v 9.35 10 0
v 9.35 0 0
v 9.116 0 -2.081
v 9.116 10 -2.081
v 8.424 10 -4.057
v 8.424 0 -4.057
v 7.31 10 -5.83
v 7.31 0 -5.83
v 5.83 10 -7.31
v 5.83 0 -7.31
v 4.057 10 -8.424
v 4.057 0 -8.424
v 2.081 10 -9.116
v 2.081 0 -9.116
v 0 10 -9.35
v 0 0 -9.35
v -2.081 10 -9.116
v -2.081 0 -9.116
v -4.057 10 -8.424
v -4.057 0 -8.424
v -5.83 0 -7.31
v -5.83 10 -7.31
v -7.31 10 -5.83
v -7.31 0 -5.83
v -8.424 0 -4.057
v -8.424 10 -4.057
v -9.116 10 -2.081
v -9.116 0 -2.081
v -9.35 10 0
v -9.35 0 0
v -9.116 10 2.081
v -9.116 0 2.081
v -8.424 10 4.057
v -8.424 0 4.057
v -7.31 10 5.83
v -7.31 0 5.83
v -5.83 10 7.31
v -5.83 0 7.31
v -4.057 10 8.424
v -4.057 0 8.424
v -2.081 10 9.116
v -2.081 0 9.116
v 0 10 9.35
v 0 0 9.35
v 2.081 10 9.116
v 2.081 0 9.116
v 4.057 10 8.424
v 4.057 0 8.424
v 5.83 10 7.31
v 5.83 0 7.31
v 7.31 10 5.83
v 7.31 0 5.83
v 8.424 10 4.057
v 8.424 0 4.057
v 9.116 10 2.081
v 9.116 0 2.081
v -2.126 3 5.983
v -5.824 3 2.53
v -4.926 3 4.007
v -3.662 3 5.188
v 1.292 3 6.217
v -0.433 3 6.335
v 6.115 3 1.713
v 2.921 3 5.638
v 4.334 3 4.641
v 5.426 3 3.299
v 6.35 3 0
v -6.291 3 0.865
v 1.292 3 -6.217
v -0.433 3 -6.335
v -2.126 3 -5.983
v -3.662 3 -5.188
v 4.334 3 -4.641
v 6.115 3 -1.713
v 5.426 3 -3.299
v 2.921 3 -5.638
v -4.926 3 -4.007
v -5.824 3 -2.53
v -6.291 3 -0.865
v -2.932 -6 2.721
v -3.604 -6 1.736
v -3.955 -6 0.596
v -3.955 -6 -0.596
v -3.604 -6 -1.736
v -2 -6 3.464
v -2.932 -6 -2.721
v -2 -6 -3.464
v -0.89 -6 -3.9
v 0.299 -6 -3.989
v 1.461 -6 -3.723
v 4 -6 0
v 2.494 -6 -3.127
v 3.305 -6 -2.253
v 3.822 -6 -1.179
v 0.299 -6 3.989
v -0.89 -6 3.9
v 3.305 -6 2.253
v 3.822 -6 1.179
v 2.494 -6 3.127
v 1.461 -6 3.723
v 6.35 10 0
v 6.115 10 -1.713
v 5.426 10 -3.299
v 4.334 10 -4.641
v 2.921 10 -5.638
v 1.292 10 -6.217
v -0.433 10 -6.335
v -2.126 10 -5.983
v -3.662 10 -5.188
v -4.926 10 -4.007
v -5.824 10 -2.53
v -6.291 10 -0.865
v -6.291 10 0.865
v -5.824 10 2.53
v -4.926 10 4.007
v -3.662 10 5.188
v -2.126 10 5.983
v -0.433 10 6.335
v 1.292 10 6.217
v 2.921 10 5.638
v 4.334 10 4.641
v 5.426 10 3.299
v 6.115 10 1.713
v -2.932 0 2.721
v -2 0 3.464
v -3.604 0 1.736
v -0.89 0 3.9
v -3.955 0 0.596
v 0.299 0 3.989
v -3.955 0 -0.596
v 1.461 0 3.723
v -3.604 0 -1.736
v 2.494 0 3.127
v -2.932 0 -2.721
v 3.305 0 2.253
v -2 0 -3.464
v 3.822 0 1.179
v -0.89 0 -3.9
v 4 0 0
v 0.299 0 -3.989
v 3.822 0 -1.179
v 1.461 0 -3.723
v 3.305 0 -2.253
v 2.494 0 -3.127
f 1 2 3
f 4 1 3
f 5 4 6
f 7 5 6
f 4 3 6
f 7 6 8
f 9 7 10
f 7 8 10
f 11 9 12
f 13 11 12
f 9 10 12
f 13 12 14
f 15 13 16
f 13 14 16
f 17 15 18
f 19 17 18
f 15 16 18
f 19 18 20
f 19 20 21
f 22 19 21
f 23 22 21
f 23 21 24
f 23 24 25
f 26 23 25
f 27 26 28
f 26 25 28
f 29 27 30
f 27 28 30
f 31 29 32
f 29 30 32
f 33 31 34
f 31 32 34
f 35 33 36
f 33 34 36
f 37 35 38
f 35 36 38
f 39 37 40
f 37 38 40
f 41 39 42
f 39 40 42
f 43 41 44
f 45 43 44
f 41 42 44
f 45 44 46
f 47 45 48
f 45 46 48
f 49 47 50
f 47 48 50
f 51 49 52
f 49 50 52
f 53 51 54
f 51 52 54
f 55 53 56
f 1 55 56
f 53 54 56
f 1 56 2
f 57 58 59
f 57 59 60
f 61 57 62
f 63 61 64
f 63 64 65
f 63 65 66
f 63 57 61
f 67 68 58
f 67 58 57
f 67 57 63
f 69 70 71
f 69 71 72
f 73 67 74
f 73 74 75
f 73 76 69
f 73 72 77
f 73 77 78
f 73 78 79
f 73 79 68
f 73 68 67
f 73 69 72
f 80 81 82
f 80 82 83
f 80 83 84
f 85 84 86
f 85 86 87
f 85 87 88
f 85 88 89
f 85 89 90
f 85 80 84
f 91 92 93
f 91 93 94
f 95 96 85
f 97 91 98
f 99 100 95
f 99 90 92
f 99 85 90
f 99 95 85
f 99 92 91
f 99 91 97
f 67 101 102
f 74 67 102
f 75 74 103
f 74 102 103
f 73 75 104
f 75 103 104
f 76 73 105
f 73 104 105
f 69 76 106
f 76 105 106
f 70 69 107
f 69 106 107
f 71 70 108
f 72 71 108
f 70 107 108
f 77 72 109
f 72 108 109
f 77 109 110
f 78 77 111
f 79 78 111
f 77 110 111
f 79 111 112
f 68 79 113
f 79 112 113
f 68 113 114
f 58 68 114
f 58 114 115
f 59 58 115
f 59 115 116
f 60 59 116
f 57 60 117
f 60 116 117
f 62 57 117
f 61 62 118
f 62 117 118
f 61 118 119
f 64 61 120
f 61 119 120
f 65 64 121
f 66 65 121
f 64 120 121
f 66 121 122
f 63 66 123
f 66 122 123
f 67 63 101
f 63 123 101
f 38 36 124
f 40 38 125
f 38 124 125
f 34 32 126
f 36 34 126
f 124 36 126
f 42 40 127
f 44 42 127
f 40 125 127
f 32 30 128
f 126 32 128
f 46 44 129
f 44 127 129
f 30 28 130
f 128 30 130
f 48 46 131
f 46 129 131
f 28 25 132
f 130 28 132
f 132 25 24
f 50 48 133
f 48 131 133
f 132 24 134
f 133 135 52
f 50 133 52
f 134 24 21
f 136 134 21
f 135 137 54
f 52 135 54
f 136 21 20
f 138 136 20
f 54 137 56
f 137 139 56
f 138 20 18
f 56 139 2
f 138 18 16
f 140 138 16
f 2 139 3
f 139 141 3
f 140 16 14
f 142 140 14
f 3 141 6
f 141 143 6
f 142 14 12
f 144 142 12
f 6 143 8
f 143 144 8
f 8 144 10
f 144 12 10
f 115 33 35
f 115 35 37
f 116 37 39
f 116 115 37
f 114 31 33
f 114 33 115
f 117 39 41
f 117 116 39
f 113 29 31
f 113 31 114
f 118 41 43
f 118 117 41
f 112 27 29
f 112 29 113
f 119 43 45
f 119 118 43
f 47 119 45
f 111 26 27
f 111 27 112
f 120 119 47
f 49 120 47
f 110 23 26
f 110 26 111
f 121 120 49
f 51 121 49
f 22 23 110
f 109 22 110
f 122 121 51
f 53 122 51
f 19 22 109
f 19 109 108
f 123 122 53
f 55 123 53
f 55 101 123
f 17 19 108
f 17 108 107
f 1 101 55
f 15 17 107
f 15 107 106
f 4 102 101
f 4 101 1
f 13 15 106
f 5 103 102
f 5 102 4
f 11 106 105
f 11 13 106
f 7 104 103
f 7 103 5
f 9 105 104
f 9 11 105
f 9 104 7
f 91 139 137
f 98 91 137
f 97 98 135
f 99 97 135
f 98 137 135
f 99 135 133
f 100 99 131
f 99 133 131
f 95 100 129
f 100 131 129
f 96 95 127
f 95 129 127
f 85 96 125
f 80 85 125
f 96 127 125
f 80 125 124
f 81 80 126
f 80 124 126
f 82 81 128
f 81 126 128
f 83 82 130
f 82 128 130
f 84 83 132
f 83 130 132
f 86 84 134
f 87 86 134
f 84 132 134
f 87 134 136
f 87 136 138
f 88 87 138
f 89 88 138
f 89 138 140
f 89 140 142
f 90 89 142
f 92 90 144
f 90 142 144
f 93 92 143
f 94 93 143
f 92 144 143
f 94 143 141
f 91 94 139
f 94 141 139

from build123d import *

# Parameters (mm, degrees)
SKETCH1_R           = 9.35
BOSS_EXTRUDE1_DEPTH = 10
SKETCH2_R           = 6.35
CUT_EXTRUDE1_DEPTH  = 7
SKETCH3_R           = 4
BOSS_EXTRUDE2_DEPTH = 6


with BuildPart() as part:
    # Sketch1 → Boss-Extrude1 (new body)
    with BuildSketch(Plane(origin=(0, 0, 0), x_dir=(1, 0, 0), z_dir=(0, 1, 0))):
        Circle(SKETCH1_R)
    extrude(amount=BOSS_EXTRUDE1_DEPTH)

    # Sketch2 → Cut-Extrude1 (cut)
    with BuildSketch(Plane(origin=(0, 10, 0), x_dir=(1, 0, 0), z_dir=(0, 1, 0))):
        Circle(SKETCH2_R)
    extrude(amount=-CUT_EXTRUDE1_DEPTH, mode=Mode.SUBTRACT)

    # Sketch3 → Boss-Extrude2 (add)
    with BuildSketch(Plane.XZ):
        Circle(SKETCH3_R)
    extrude(amount=BOSS_EXTRUDE2_DEPTH)


solid = part.part
